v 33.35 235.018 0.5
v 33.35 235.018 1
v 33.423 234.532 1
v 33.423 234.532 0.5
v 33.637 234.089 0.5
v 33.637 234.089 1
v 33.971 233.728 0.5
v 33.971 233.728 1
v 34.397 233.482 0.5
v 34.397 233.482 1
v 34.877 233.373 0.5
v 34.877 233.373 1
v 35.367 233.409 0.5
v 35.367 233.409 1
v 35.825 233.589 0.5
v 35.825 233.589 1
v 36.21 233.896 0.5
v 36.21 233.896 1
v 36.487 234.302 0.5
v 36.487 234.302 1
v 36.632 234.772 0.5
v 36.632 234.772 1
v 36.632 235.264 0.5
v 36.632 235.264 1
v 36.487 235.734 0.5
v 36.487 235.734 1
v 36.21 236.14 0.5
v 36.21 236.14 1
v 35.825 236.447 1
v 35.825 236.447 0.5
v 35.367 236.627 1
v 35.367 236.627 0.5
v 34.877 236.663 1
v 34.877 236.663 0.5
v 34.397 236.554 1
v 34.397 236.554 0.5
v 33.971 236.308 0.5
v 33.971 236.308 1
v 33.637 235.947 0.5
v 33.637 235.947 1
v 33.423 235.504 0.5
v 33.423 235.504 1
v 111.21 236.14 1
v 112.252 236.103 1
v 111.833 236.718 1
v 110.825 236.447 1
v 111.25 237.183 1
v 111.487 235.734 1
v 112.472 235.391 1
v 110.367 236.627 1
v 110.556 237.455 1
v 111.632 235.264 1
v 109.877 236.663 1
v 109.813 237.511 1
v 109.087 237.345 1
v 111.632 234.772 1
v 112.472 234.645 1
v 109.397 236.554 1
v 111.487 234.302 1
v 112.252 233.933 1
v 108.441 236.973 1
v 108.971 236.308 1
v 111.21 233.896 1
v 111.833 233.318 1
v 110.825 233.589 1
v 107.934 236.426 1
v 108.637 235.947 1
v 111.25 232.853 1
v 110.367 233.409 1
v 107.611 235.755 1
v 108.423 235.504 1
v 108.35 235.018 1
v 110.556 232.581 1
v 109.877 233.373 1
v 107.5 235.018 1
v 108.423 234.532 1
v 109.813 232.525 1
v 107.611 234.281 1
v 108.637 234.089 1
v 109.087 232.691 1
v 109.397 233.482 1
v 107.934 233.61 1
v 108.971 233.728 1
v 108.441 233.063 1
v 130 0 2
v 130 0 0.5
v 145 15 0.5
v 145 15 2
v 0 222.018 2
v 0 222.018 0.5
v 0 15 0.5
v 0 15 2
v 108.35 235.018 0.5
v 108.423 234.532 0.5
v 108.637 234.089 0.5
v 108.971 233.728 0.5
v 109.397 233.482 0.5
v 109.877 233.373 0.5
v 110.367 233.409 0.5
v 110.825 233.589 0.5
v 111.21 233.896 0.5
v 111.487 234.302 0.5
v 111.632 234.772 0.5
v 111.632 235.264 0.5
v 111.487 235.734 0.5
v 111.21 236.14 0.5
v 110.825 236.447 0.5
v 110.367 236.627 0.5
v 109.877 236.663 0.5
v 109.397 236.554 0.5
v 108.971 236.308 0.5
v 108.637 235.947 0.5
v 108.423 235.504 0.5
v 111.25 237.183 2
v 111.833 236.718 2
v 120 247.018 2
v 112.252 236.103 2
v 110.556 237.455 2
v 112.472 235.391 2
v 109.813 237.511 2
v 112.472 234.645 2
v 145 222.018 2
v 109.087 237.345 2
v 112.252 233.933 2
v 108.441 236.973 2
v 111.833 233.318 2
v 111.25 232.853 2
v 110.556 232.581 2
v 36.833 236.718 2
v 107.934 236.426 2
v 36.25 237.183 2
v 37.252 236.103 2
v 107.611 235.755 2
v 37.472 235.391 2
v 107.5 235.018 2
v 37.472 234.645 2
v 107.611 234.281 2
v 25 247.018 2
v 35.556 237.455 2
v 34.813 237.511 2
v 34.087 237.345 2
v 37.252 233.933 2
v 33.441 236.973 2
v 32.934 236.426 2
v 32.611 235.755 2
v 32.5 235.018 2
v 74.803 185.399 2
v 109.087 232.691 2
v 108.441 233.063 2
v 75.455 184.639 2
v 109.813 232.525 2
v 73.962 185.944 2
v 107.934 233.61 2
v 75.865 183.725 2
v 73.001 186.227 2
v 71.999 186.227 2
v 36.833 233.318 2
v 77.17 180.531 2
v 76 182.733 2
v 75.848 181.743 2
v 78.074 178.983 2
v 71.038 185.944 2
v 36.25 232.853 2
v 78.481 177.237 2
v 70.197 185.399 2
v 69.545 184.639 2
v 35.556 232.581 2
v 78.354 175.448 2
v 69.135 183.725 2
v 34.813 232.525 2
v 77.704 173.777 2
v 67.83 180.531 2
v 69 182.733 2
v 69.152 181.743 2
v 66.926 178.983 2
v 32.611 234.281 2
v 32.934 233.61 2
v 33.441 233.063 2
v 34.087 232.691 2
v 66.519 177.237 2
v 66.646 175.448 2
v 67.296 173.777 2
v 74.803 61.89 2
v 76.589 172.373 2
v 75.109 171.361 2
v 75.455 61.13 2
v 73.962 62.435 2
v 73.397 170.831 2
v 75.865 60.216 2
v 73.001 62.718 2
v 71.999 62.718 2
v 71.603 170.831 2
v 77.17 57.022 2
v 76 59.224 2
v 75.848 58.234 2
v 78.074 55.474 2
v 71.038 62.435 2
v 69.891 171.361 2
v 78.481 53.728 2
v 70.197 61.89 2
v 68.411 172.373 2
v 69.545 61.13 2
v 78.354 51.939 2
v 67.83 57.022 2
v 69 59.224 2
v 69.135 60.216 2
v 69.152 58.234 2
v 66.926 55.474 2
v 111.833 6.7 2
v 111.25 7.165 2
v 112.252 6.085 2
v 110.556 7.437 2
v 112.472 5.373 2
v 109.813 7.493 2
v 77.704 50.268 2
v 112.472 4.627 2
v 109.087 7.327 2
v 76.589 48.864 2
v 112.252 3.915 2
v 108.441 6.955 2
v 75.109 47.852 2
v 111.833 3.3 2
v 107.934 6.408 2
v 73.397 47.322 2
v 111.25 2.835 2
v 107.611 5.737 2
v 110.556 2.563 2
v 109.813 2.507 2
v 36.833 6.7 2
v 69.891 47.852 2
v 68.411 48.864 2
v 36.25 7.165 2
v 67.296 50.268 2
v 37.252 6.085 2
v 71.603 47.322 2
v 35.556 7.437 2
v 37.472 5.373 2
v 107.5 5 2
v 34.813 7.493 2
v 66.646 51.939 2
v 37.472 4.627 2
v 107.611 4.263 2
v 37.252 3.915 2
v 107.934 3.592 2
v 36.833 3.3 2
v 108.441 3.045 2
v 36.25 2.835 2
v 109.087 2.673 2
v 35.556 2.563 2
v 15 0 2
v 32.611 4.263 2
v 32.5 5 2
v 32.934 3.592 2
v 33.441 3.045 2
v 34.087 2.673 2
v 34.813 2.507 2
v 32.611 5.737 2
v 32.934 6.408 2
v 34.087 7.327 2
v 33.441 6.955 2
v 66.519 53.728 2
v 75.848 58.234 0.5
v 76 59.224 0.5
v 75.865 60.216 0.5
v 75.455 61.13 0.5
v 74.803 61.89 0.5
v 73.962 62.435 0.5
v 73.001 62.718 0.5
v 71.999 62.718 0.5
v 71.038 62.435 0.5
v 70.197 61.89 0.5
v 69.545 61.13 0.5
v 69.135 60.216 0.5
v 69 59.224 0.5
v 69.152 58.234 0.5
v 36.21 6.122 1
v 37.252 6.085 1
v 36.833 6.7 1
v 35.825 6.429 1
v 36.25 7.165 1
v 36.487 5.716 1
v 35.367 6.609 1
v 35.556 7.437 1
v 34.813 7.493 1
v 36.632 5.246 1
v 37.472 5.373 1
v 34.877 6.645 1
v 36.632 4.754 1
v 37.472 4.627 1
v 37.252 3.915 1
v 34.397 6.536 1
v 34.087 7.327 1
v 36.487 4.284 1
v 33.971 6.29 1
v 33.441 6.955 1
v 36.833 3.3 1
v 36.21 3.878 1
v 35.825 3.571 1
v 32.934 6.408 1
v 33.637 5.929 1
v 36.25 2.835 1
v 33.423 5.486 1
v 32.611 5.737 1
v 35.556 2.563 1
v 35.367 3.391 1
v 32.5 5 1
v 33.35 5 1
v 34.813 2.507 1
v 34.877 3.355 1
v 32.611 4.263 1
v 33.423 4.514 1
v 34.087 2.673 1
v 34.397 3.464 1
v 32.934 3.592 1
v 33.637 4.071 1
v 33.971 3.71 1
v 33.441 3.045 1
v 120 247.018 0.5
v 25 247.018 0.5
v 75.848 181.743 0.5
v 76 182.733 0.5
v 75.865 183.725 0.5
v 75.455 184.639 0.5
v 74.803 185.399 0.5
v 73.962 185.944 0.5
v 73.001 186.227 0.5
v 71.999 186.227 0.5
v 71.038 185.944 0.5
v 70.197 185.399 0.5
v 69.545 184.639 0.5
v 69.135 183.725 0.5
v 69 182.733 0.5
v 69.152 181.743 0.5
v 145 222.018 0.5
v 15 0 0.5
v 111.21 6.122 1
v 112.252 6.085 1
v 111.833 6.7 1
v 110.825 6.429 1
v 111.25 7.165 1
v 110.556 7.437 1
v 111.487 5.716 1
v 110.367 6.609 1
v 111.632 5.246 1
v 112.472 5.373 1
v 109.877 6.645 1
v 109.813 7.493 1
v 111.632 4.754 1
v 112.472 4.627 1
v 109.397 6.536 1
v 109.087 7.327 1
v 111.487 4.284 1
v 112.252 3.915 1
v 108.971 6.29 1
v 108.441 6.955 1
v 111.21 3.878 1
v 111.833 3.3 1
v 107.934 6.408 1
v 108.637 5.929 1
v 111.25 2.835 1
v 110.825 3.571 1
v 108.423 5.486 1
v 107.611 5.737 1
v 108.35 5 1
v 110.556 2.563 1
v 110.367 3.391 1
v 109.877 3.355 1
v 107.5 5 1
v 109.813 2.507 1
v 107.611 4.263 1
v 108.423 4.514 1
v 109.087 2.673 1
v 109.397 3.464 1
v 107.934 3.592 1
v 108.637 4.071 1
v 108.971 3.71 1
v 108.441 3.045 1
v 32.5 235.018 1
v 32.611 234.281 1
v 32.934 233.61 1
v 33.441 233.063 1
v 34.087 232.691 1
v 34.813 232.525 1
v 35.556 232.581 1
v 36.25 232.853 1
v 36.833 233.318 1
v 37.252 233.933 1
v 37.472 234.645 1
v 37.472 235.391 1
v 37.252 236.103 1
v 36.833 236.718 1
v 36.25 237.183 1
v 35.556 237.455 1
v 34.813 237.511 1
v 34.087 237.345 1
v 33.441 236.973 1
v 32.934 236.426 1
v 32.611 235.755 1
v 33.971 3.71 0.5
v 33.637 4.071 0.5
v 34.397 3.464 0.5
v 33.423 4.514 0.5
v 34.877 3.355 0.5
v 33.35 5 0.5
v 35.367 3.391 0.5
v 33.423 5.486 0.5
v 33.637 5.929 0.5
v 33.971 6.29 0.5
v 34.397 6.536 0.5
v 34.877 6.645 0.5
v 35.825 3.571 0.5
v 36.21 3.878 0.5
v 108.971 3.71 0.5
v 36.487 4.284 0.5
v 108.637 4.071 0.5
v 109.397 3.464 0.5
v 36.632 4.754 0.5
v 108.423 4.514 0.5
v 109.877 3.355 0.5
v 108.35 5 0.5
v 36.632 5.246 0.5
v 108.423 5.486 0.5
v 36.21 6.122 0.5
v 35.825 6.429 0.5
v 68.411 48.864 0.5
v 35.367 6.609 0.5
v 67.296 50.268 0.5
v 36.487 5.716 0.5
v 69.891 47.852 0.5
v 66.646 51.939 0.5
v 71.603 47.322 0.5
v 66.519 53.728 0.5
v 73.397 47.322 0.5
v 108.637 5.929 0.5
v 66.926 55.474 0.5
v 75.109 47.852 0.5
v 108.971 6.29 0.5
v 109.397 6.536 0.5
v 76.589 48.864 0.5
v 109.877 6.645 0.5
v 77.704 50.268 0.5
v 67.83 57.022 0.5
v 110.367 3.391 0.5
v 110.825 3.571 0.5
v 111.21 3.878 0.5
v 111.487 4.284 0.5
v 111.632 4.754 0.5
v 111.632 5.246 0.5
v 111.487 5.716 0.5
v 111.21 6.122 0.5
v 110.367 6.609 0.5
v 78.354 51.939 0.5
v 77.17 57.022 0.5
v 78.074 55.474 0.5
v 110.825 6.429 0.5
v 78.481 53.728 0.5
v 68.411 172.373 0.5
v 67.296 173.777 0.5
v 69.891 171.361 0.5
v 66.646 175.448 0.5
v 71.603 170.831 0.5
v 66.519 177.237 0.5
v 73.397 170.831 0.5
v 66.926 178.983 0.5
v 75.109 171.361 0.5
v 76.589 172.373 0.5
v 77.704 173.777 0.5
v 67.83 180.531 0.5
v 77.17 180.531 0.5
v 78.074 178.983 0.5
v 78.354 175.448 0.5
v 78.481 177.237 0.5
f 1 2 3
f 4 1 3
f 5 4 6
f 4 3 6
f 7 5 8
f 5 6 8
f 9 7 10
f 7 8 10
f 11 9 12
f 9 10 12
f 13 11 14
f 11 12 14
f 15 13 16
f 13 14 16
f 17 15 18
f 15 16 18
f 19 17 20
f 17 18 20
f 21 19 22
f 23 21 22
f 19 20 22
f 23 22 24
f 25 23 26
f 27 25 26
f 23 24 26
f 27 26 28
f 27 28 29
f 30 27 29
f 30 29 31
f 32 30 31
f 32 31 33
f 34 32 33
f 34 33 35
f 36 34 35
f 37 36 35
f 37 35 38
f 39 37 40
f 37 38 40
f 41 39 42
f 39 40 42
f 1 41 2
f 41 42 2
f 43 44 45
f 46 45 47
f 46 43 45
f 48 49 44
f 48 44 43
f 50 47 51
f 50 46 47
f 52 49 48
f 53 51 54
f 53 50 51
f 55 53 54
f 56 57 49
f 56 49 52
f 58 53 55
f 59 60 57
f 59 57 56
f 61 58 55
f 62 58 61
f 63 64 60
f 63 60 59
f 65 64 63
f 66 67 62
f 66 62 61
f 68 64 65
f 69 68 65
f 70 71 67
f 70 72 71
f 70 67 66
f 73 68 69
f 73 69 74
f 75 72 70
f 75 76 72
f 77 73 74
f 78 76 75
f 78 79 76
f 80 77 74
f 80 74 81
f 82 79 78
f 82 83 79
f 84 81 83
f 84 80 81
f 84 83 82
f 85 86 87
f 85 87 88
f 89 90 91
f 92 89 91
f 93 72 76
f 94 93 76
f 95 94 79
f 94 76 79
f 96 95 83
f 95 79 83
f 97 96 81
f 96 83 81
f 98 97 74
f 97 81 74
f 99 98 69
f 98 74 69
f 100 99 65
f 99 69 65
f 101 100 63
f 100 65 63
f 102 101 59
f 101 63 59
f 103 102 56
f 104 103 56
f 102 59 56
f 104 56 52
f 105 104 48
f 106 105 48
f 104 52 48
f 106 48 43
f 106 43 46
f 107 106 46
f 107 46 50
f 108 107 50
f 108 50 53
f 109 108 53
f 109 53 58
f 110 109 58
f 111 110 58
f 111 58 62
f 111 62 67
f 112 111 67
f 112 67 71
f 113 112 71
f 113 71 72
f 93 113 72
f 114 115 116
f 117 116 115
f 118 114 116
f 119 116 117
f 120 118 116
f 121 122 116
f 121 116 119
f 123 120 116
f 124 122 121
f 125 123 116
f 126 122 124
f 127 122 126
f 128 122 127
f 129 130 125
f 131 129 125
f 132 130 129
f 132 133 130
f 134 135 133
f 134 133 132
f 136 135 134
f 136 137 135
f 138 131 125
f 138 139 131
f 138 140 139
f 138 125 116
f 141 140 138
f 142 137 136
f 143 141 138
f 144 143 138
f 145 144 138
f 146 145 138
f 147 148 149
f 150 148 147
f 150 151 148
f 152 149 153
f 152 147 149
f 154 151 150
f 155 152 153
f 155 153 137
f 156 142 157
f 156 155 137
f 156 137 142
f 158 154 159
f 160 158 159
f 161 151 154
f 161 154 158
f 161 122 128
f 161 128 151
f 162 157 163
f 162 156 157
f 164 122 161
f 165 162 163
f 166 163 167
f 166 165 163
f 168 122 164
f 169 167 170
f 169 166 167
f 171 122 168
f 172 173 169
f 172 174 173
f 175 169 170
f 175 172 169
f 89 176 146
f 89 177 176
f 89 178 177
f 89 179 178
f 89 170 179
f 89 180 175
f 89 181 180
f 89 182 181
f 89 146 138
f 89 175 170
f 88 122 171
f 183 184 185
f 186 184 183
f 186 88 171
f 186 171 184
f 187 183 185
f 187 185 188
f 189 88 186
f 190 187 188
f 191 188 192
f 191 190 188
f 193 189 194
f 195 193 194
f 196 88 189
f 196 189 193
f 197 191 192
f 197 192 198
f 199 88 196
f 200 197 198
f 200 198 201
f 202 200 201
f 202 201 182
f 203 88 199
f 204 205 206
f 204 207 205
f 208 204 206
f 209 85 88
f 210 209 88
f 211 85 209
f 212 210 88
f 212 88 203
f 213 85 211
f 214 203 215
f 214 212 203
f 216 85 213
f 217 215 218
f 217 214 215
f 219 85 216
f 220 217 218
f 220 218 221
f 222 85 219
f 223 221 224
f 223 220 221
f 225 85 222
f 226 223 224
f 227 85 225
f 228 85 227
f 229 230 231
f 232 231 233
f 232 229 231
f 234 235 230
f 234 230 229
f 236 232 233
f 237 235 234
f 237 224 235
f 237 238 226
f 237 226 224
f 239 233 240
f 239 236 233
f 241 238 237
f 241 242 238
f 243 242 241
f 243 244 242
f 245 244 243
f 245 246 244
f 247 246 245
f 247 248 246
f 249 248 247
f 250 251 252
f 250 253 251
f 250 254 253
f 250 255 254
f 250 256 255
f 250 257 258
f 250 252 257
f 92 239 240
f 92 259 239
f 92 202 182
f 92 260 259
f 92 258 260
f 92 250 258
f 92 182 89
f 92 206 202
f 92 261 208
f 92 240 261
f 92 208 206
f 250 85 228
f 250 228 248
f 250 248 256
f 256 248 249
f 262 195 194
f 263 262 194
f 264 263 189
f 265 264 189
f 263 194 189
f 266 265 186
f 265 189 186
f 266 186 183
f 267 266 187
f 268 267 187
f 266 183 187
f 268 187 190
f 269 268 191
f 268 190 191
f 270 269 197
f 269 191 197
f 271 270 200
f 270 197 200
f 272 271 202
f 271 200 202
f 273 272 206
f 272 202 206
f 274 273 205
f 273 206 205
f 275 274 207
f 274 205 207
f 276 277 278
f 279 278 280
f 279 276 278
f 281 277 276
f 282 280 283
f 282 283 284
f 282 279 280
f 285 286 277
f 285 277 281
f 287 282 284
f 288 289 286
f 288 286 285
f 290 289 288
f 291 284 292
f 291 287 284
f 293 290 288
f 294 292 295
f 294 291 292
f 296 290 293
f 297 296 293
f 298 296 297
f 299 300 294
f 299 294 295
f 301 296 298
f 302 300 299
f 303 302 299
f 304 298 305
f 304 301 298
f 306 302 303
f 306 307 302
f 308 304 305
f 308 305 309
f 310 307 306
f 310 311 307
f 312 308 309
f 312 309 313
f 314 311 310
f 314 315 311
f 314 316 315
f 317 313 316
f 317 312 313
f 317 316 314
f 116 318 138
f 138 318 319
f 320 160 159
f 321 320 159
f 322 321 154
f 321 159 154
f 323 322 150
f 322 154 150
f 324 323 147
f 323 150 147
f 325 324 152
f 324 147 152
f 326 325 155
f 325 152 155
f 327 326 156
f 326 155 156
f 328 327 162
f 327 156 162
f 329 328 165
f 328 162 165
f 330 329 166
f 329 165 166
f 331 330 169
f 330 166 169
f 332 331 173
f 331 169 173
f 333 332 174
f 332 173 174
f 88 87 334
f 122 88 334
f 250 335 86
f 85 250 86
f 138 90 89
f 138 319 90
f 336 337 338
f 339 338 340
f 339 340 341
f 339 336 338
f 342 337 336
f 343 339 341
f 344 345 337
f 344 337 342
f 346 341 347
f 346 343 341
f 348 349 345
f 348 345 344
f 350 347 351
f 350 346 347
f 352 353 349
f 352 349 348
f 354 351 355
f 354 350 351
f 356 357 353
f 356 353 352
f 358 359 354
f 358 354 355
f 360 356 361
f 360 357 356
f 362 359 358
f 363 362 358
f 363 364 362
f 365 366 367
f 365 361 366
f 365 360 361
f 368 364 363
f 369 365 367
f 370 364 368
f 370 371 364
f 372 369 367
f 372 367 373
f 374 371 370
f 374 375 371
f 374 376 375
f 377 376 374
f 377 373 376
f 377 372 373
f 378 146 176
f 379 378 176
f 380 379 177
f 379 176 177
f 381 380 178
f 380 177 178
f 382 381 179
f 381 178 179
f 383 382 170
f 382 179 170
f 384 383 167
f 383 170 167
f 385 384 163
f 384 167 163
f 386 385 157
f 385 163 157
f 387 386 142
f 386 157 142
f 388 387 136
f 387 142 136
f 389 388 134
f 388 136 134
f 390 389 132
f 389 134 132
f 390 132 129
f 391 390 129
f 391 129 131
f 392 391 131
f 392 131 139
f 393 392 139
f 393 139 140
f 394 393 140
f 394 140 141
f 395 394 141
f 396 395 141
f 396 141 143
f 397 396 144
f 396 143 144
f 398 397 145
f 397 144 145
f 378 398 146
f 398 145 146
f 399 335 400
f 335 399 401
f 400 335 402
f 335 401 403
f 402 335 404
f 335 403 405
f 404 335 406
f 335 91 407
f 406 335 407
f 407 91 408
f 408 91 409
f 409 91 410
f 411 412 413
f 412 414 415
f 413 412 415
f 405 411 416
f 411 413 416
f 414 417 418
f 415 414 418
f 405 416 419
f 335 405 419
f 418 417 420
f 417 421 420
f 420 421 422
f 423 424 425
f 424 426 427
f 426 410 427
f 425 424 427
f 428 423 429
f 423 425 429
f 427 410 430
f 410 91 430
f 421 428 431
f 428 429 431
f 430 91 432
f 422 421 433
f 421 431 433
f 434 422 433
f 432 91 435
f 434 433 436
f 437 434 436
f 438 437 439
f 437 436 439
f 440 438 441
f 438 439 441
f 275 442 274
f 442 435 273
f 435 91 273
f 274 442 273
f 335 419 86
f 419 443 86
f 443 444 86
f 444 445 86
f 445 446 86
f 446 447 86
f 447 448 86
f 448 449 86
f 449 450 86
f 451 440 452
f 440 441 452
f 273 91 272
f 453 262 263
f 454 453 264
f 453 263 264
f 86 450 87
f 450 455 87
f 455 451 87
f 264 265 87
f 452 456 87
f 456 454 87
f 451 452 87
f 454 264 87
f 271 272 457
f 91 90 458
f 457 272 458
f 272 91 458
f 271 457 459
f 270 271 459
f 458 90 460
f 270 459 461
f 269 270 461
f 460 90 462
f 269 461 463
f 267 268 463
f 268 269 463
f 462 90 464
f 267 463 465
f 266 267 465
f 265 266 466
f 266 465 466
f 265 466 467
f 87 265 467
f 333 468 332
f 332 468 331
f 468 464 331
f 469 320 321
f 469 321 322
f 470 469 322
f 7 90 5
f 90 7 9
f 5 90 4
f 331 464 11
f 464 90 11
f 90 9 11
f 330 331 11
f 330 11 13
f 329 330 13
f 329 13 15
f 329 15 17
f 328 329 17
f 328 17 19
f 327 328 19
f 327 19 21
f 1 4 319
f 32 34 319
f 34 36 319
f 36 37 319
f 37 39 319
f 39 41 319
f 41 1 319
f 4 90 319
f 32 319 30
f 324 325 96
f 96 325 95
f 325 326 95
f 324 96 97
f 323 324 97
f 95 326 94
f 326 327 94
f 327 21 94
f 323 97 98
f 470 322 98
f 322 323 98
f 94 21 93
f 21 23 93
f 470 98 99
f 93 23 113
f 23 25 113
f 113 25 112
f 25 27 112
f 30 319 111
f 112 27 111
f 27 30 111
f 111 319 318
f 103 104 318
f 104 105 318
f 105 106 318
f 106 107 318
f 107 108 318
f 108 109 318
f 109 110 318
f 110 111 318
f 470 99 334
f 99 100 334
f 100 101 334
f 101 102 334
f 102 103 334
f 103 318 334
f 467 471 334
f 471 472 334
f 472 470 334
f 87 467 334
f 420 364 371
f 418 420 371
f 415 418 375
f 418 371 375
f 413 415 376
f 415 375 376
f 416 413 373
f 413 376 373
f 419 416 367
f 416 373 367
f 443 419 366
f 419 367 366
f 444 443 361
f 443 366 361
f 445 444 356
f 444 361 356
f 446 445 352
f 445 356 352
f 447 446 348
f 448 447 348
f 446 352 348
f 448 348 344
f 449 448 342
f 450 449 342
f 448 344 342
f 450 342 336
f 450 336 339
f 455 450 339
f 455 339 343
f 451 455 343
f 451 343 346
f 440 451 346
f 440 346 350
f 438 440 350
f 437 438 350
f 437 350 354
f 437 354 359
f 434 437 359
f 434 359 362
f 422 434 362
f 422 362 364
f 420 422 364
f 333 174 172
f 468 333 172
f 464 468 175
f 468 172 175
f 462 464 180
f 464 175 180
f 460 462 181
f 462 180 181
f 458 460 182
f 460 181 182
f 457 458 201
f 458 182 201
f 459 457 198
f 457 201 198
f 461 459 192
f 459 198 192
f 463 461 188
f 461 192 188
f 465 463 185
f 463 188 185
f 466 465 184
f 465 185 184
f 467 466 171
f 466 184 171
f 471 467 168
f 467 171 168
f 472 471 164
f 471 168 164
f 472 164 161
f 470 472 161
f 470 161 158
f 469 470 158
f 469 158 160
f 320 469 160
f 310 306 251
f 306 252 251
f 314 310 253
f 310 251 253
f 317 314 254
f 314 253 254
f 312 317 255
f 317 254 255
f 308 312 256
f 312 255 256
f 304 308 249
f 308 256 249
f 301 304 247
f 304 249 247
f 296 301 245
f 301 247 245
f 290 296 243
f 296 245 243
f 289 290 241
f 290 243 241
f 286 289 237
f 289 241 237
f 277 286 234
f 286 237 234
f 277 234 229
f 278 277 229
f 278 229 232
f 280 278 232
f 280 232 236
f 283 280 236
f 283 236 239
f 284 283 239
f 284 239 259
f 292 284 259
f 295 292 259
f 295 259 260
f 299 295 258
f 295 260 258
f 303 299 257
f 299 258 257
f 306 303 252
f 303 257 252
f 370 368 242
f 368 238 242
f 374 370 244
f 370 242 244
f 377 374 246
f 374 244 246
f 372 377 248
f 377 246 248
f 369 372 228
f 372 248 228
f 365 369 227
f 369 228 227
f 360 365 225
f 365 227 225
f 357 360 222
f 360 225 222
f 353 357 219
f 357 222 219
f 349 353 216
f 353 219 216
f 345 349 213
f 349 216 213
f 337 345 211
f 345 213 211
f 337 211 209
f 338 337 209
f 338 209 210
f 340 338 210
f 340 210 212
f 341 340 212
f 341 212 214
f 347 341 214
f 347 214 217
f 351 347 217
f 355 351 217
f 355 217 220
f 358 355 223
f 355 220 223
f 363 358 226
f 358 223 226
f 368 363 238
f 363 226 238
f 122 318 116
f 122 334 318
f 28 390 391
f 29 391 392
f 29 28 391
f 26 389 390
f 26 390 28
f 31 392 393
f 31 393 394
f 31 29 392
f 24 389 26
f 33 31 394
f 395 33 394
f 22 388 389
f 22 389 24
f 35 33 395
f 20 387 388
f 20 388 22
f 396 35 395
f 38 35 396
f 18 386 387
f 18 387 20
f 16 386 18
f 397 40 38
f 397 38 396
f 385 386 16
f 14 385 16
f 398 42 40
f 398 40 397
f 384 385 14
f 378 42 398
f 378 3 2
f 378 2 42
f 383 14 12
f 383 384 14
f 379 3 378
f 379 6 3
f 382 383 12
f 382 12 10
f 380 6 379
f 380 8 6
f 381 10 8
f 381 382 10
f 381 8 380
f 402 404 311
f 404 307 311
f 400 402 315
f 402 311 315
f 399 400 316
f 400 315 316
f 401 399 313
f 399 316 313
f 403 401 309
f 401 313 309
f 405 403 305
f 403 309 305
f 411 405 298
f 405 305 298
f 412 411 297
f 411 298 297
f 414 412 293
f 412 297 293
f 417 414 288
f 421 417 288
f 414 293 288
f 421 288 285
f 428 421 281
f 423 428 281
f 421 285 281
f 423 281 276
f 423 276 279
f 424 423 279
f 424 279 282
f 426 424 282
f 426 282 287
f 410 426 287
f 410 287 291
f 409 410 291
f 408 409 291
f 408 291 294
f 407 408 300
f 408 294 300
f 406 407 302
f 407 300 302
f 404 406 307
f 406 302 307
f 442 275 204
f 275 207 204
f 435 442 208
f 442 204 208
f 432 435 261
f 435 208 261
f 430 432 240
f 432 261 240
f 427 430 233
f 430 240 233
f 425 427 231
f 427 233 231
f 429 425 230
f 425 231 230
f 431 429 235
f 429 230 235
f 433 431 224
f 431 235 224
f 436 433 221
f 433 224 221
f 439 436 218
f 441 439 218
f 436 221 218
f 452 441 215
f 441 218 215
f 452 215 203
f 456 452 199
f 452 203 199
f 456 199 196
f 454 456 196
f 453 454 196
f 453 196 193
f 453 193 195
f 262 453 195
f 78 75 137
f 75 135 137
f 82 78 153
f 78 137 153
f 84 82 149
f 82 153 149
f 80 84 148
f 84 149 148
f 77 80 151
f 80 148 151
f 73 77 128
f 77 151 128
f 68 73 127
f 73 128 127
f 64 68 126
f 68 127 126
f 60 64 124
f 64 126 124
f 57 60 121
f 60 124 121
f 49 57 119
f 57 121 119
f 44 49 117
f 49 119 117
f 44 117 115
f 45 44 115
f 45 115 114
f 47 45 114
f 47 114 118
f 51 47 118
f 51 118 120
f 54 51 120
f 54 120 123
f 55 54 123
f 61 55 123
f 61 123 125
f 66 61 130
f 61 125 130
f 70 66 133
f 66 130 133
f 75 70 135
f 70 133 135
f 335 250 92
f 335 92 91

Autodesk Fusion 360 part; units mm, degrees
sketch "Sketch1" plane through (0, 0, 0) normal (0, 0, 1) x (1, 0, 0)
  line L0 (0, 0) -> (145, 0)
  line L1 (145, 0) -> (145, 247.018)
  line L2 (145, 247.018) -> (0, 247.018)
  line L3 (0, 247.018) -> (0, 0)
  dimension "d1" = 247.018
  dimension "d2" = 145
extrude "Extrude1" add sketch "Sketch1" along normal blind 3
chamfer "Chamfer1" distance 15 angle 45 2 edges at (0, 0, 1.5) (145, 0, 1.5)
chamfer "Chamfer2" distance 25 angle 45 2 edges at (0, 247.018, 1.5) (145, 247.018, 1.5)
sketch "Sketch3" plane through (0, 0, 3) normal (0, 0, 1) x (-1, 0, 0)
  line L0 (-145, -222.018) -> (-120, -247.018)
  line L1 (-120, -247.018) -> (-25, -247.018)
  line L2 (-25, -247.018) -> (0, -222.018)
  line L3 (0, -222.018) -> (0, -15)
  line L4 (0, -15) -> (-15, 0)
  line L5 (-15, 0) -> (-130, 0)
  line L6 (-130, 0) -> (-145, -15)
  line L7 (-145, -15) -> (-145, -222.018)
  circle A0 centre (-35, -235.018) radius 2.5
  circle A1 centre (-110, -235.018) radius 2.5
  circle A2 centre (-110, -5) radius 2.5
  circle A3 centre (-35, -5) radius 2.5
  circle A4 centre (-35, -5) radius 1.65
  circle A5 centre (-110, -5) radius 1.65
  circle A6 centre (-110, -235.018) radius 1.65
  circle A7 centre (-35, -235.018) radius 1.65
  dimension "d27" = 35
  dimension "d28" = 35
  dimension "d29" = 12
  dimension "d30" = 5
  dimension "d31" = 5
  dimension "d32" = 5
  dimension "d33" = 5
  dimension "d34" = 5
  dimension "d35" = 3.3
  dimension "d36" = 3.3
  dimension "d37" = 3.3
  dimension "d38" = 3.3
extrude "Extrude5" cut sketch "Sketch3" against normal blind 2 contours A0 | A1 | A2 | A3
extrude "Extrude4" cut sketch "Sketch3" against normal blind 3 contours A4 | A5 | A6 | A7
sketch "Sketch4" plane through (0, 0, 3) normal (0, 0, 1) x (-1, 0, 0)
  circle A0 centre (-110, -5) radius 2.5
  circle A1 centre (-110, -235.018) radius 2.5
  circle A2 centre (-35, -5) radius 2.5
  circle A3 centre (-35, -235.018) radius 2.5
  line L0 (-145, -222.018) -> (-120, -247.018)
  line L1 (-120, -247.018) -> (-25, -247.018)
  line L2 (-25, -247.018) -> (0, -222.018)
  line L3 (0, -222.018) -> (0, -15)
  line L4 (0, -15) -> (-15, 0)
  line L5 (-15, 0) -> (-130, 0)
  line L6 (-130, 0) -> (-145, -15)
  line L7 (-145, -15) -> (-145, -222.018)
  line L8 (-72.5, -247.018) -> (-72.5, 0)
  line L9 (0, -118.509) -> (-145, -118.509)
  line L10 (-72.5, -118.509) -> (-72.5, -247.018)
  line L11 (-72.5, -182.7635) -> (0, -182.7635)
  line L12 (-72.5, -118.509) -> (-72.5, 0)
  line L13 (-72.5, -59.2545) -> (0, -59.2545)
  circle A4 centre (-72.5, -182.7635) radius 3.5
  circle A5 centre (-72.5, -59.2545) radius 3.5
  circle A6 centre (-72.5, -53.2545) radius 6
  circle A7 centre (-72.5, -176.7635) radius 6
  dimension "d43" = 7
  dimension "d44" = 7
  dimension "d45" = 12
  dimension "d46" = 12
extrude "Extrude6" cut sketch "Sketch4" against normal blind 3 contours L8 L12 A5 A6 | L8 L12 L13 A5 | L8 L12 A5 A6 | L13 A5 A6 | L8 L12 A5 A6 | L8 L12 A5 A6 | L8 L12 A5 A6
extrude "Extrude7" cut sketch "Sketch4" against normal blind 3 contours L8 L10 A4 A7 | L8 L10 L11 A4 | L8 L10 A4 A7 | L8 L10 A4 A7 | L8 L10 A4 A7 | L11 A4 A7 | L8 L10 A4 A7
extrude "Extrude10" cut sketch "Sketch3" against normal blind 1 contours L0 L1 L2 L3 L4 L5 L6 L7
extrude "Extrude11" cut 1 faces at (122.568, 136.9318, 0) along direction (0, 0, 1) blind 0.5
